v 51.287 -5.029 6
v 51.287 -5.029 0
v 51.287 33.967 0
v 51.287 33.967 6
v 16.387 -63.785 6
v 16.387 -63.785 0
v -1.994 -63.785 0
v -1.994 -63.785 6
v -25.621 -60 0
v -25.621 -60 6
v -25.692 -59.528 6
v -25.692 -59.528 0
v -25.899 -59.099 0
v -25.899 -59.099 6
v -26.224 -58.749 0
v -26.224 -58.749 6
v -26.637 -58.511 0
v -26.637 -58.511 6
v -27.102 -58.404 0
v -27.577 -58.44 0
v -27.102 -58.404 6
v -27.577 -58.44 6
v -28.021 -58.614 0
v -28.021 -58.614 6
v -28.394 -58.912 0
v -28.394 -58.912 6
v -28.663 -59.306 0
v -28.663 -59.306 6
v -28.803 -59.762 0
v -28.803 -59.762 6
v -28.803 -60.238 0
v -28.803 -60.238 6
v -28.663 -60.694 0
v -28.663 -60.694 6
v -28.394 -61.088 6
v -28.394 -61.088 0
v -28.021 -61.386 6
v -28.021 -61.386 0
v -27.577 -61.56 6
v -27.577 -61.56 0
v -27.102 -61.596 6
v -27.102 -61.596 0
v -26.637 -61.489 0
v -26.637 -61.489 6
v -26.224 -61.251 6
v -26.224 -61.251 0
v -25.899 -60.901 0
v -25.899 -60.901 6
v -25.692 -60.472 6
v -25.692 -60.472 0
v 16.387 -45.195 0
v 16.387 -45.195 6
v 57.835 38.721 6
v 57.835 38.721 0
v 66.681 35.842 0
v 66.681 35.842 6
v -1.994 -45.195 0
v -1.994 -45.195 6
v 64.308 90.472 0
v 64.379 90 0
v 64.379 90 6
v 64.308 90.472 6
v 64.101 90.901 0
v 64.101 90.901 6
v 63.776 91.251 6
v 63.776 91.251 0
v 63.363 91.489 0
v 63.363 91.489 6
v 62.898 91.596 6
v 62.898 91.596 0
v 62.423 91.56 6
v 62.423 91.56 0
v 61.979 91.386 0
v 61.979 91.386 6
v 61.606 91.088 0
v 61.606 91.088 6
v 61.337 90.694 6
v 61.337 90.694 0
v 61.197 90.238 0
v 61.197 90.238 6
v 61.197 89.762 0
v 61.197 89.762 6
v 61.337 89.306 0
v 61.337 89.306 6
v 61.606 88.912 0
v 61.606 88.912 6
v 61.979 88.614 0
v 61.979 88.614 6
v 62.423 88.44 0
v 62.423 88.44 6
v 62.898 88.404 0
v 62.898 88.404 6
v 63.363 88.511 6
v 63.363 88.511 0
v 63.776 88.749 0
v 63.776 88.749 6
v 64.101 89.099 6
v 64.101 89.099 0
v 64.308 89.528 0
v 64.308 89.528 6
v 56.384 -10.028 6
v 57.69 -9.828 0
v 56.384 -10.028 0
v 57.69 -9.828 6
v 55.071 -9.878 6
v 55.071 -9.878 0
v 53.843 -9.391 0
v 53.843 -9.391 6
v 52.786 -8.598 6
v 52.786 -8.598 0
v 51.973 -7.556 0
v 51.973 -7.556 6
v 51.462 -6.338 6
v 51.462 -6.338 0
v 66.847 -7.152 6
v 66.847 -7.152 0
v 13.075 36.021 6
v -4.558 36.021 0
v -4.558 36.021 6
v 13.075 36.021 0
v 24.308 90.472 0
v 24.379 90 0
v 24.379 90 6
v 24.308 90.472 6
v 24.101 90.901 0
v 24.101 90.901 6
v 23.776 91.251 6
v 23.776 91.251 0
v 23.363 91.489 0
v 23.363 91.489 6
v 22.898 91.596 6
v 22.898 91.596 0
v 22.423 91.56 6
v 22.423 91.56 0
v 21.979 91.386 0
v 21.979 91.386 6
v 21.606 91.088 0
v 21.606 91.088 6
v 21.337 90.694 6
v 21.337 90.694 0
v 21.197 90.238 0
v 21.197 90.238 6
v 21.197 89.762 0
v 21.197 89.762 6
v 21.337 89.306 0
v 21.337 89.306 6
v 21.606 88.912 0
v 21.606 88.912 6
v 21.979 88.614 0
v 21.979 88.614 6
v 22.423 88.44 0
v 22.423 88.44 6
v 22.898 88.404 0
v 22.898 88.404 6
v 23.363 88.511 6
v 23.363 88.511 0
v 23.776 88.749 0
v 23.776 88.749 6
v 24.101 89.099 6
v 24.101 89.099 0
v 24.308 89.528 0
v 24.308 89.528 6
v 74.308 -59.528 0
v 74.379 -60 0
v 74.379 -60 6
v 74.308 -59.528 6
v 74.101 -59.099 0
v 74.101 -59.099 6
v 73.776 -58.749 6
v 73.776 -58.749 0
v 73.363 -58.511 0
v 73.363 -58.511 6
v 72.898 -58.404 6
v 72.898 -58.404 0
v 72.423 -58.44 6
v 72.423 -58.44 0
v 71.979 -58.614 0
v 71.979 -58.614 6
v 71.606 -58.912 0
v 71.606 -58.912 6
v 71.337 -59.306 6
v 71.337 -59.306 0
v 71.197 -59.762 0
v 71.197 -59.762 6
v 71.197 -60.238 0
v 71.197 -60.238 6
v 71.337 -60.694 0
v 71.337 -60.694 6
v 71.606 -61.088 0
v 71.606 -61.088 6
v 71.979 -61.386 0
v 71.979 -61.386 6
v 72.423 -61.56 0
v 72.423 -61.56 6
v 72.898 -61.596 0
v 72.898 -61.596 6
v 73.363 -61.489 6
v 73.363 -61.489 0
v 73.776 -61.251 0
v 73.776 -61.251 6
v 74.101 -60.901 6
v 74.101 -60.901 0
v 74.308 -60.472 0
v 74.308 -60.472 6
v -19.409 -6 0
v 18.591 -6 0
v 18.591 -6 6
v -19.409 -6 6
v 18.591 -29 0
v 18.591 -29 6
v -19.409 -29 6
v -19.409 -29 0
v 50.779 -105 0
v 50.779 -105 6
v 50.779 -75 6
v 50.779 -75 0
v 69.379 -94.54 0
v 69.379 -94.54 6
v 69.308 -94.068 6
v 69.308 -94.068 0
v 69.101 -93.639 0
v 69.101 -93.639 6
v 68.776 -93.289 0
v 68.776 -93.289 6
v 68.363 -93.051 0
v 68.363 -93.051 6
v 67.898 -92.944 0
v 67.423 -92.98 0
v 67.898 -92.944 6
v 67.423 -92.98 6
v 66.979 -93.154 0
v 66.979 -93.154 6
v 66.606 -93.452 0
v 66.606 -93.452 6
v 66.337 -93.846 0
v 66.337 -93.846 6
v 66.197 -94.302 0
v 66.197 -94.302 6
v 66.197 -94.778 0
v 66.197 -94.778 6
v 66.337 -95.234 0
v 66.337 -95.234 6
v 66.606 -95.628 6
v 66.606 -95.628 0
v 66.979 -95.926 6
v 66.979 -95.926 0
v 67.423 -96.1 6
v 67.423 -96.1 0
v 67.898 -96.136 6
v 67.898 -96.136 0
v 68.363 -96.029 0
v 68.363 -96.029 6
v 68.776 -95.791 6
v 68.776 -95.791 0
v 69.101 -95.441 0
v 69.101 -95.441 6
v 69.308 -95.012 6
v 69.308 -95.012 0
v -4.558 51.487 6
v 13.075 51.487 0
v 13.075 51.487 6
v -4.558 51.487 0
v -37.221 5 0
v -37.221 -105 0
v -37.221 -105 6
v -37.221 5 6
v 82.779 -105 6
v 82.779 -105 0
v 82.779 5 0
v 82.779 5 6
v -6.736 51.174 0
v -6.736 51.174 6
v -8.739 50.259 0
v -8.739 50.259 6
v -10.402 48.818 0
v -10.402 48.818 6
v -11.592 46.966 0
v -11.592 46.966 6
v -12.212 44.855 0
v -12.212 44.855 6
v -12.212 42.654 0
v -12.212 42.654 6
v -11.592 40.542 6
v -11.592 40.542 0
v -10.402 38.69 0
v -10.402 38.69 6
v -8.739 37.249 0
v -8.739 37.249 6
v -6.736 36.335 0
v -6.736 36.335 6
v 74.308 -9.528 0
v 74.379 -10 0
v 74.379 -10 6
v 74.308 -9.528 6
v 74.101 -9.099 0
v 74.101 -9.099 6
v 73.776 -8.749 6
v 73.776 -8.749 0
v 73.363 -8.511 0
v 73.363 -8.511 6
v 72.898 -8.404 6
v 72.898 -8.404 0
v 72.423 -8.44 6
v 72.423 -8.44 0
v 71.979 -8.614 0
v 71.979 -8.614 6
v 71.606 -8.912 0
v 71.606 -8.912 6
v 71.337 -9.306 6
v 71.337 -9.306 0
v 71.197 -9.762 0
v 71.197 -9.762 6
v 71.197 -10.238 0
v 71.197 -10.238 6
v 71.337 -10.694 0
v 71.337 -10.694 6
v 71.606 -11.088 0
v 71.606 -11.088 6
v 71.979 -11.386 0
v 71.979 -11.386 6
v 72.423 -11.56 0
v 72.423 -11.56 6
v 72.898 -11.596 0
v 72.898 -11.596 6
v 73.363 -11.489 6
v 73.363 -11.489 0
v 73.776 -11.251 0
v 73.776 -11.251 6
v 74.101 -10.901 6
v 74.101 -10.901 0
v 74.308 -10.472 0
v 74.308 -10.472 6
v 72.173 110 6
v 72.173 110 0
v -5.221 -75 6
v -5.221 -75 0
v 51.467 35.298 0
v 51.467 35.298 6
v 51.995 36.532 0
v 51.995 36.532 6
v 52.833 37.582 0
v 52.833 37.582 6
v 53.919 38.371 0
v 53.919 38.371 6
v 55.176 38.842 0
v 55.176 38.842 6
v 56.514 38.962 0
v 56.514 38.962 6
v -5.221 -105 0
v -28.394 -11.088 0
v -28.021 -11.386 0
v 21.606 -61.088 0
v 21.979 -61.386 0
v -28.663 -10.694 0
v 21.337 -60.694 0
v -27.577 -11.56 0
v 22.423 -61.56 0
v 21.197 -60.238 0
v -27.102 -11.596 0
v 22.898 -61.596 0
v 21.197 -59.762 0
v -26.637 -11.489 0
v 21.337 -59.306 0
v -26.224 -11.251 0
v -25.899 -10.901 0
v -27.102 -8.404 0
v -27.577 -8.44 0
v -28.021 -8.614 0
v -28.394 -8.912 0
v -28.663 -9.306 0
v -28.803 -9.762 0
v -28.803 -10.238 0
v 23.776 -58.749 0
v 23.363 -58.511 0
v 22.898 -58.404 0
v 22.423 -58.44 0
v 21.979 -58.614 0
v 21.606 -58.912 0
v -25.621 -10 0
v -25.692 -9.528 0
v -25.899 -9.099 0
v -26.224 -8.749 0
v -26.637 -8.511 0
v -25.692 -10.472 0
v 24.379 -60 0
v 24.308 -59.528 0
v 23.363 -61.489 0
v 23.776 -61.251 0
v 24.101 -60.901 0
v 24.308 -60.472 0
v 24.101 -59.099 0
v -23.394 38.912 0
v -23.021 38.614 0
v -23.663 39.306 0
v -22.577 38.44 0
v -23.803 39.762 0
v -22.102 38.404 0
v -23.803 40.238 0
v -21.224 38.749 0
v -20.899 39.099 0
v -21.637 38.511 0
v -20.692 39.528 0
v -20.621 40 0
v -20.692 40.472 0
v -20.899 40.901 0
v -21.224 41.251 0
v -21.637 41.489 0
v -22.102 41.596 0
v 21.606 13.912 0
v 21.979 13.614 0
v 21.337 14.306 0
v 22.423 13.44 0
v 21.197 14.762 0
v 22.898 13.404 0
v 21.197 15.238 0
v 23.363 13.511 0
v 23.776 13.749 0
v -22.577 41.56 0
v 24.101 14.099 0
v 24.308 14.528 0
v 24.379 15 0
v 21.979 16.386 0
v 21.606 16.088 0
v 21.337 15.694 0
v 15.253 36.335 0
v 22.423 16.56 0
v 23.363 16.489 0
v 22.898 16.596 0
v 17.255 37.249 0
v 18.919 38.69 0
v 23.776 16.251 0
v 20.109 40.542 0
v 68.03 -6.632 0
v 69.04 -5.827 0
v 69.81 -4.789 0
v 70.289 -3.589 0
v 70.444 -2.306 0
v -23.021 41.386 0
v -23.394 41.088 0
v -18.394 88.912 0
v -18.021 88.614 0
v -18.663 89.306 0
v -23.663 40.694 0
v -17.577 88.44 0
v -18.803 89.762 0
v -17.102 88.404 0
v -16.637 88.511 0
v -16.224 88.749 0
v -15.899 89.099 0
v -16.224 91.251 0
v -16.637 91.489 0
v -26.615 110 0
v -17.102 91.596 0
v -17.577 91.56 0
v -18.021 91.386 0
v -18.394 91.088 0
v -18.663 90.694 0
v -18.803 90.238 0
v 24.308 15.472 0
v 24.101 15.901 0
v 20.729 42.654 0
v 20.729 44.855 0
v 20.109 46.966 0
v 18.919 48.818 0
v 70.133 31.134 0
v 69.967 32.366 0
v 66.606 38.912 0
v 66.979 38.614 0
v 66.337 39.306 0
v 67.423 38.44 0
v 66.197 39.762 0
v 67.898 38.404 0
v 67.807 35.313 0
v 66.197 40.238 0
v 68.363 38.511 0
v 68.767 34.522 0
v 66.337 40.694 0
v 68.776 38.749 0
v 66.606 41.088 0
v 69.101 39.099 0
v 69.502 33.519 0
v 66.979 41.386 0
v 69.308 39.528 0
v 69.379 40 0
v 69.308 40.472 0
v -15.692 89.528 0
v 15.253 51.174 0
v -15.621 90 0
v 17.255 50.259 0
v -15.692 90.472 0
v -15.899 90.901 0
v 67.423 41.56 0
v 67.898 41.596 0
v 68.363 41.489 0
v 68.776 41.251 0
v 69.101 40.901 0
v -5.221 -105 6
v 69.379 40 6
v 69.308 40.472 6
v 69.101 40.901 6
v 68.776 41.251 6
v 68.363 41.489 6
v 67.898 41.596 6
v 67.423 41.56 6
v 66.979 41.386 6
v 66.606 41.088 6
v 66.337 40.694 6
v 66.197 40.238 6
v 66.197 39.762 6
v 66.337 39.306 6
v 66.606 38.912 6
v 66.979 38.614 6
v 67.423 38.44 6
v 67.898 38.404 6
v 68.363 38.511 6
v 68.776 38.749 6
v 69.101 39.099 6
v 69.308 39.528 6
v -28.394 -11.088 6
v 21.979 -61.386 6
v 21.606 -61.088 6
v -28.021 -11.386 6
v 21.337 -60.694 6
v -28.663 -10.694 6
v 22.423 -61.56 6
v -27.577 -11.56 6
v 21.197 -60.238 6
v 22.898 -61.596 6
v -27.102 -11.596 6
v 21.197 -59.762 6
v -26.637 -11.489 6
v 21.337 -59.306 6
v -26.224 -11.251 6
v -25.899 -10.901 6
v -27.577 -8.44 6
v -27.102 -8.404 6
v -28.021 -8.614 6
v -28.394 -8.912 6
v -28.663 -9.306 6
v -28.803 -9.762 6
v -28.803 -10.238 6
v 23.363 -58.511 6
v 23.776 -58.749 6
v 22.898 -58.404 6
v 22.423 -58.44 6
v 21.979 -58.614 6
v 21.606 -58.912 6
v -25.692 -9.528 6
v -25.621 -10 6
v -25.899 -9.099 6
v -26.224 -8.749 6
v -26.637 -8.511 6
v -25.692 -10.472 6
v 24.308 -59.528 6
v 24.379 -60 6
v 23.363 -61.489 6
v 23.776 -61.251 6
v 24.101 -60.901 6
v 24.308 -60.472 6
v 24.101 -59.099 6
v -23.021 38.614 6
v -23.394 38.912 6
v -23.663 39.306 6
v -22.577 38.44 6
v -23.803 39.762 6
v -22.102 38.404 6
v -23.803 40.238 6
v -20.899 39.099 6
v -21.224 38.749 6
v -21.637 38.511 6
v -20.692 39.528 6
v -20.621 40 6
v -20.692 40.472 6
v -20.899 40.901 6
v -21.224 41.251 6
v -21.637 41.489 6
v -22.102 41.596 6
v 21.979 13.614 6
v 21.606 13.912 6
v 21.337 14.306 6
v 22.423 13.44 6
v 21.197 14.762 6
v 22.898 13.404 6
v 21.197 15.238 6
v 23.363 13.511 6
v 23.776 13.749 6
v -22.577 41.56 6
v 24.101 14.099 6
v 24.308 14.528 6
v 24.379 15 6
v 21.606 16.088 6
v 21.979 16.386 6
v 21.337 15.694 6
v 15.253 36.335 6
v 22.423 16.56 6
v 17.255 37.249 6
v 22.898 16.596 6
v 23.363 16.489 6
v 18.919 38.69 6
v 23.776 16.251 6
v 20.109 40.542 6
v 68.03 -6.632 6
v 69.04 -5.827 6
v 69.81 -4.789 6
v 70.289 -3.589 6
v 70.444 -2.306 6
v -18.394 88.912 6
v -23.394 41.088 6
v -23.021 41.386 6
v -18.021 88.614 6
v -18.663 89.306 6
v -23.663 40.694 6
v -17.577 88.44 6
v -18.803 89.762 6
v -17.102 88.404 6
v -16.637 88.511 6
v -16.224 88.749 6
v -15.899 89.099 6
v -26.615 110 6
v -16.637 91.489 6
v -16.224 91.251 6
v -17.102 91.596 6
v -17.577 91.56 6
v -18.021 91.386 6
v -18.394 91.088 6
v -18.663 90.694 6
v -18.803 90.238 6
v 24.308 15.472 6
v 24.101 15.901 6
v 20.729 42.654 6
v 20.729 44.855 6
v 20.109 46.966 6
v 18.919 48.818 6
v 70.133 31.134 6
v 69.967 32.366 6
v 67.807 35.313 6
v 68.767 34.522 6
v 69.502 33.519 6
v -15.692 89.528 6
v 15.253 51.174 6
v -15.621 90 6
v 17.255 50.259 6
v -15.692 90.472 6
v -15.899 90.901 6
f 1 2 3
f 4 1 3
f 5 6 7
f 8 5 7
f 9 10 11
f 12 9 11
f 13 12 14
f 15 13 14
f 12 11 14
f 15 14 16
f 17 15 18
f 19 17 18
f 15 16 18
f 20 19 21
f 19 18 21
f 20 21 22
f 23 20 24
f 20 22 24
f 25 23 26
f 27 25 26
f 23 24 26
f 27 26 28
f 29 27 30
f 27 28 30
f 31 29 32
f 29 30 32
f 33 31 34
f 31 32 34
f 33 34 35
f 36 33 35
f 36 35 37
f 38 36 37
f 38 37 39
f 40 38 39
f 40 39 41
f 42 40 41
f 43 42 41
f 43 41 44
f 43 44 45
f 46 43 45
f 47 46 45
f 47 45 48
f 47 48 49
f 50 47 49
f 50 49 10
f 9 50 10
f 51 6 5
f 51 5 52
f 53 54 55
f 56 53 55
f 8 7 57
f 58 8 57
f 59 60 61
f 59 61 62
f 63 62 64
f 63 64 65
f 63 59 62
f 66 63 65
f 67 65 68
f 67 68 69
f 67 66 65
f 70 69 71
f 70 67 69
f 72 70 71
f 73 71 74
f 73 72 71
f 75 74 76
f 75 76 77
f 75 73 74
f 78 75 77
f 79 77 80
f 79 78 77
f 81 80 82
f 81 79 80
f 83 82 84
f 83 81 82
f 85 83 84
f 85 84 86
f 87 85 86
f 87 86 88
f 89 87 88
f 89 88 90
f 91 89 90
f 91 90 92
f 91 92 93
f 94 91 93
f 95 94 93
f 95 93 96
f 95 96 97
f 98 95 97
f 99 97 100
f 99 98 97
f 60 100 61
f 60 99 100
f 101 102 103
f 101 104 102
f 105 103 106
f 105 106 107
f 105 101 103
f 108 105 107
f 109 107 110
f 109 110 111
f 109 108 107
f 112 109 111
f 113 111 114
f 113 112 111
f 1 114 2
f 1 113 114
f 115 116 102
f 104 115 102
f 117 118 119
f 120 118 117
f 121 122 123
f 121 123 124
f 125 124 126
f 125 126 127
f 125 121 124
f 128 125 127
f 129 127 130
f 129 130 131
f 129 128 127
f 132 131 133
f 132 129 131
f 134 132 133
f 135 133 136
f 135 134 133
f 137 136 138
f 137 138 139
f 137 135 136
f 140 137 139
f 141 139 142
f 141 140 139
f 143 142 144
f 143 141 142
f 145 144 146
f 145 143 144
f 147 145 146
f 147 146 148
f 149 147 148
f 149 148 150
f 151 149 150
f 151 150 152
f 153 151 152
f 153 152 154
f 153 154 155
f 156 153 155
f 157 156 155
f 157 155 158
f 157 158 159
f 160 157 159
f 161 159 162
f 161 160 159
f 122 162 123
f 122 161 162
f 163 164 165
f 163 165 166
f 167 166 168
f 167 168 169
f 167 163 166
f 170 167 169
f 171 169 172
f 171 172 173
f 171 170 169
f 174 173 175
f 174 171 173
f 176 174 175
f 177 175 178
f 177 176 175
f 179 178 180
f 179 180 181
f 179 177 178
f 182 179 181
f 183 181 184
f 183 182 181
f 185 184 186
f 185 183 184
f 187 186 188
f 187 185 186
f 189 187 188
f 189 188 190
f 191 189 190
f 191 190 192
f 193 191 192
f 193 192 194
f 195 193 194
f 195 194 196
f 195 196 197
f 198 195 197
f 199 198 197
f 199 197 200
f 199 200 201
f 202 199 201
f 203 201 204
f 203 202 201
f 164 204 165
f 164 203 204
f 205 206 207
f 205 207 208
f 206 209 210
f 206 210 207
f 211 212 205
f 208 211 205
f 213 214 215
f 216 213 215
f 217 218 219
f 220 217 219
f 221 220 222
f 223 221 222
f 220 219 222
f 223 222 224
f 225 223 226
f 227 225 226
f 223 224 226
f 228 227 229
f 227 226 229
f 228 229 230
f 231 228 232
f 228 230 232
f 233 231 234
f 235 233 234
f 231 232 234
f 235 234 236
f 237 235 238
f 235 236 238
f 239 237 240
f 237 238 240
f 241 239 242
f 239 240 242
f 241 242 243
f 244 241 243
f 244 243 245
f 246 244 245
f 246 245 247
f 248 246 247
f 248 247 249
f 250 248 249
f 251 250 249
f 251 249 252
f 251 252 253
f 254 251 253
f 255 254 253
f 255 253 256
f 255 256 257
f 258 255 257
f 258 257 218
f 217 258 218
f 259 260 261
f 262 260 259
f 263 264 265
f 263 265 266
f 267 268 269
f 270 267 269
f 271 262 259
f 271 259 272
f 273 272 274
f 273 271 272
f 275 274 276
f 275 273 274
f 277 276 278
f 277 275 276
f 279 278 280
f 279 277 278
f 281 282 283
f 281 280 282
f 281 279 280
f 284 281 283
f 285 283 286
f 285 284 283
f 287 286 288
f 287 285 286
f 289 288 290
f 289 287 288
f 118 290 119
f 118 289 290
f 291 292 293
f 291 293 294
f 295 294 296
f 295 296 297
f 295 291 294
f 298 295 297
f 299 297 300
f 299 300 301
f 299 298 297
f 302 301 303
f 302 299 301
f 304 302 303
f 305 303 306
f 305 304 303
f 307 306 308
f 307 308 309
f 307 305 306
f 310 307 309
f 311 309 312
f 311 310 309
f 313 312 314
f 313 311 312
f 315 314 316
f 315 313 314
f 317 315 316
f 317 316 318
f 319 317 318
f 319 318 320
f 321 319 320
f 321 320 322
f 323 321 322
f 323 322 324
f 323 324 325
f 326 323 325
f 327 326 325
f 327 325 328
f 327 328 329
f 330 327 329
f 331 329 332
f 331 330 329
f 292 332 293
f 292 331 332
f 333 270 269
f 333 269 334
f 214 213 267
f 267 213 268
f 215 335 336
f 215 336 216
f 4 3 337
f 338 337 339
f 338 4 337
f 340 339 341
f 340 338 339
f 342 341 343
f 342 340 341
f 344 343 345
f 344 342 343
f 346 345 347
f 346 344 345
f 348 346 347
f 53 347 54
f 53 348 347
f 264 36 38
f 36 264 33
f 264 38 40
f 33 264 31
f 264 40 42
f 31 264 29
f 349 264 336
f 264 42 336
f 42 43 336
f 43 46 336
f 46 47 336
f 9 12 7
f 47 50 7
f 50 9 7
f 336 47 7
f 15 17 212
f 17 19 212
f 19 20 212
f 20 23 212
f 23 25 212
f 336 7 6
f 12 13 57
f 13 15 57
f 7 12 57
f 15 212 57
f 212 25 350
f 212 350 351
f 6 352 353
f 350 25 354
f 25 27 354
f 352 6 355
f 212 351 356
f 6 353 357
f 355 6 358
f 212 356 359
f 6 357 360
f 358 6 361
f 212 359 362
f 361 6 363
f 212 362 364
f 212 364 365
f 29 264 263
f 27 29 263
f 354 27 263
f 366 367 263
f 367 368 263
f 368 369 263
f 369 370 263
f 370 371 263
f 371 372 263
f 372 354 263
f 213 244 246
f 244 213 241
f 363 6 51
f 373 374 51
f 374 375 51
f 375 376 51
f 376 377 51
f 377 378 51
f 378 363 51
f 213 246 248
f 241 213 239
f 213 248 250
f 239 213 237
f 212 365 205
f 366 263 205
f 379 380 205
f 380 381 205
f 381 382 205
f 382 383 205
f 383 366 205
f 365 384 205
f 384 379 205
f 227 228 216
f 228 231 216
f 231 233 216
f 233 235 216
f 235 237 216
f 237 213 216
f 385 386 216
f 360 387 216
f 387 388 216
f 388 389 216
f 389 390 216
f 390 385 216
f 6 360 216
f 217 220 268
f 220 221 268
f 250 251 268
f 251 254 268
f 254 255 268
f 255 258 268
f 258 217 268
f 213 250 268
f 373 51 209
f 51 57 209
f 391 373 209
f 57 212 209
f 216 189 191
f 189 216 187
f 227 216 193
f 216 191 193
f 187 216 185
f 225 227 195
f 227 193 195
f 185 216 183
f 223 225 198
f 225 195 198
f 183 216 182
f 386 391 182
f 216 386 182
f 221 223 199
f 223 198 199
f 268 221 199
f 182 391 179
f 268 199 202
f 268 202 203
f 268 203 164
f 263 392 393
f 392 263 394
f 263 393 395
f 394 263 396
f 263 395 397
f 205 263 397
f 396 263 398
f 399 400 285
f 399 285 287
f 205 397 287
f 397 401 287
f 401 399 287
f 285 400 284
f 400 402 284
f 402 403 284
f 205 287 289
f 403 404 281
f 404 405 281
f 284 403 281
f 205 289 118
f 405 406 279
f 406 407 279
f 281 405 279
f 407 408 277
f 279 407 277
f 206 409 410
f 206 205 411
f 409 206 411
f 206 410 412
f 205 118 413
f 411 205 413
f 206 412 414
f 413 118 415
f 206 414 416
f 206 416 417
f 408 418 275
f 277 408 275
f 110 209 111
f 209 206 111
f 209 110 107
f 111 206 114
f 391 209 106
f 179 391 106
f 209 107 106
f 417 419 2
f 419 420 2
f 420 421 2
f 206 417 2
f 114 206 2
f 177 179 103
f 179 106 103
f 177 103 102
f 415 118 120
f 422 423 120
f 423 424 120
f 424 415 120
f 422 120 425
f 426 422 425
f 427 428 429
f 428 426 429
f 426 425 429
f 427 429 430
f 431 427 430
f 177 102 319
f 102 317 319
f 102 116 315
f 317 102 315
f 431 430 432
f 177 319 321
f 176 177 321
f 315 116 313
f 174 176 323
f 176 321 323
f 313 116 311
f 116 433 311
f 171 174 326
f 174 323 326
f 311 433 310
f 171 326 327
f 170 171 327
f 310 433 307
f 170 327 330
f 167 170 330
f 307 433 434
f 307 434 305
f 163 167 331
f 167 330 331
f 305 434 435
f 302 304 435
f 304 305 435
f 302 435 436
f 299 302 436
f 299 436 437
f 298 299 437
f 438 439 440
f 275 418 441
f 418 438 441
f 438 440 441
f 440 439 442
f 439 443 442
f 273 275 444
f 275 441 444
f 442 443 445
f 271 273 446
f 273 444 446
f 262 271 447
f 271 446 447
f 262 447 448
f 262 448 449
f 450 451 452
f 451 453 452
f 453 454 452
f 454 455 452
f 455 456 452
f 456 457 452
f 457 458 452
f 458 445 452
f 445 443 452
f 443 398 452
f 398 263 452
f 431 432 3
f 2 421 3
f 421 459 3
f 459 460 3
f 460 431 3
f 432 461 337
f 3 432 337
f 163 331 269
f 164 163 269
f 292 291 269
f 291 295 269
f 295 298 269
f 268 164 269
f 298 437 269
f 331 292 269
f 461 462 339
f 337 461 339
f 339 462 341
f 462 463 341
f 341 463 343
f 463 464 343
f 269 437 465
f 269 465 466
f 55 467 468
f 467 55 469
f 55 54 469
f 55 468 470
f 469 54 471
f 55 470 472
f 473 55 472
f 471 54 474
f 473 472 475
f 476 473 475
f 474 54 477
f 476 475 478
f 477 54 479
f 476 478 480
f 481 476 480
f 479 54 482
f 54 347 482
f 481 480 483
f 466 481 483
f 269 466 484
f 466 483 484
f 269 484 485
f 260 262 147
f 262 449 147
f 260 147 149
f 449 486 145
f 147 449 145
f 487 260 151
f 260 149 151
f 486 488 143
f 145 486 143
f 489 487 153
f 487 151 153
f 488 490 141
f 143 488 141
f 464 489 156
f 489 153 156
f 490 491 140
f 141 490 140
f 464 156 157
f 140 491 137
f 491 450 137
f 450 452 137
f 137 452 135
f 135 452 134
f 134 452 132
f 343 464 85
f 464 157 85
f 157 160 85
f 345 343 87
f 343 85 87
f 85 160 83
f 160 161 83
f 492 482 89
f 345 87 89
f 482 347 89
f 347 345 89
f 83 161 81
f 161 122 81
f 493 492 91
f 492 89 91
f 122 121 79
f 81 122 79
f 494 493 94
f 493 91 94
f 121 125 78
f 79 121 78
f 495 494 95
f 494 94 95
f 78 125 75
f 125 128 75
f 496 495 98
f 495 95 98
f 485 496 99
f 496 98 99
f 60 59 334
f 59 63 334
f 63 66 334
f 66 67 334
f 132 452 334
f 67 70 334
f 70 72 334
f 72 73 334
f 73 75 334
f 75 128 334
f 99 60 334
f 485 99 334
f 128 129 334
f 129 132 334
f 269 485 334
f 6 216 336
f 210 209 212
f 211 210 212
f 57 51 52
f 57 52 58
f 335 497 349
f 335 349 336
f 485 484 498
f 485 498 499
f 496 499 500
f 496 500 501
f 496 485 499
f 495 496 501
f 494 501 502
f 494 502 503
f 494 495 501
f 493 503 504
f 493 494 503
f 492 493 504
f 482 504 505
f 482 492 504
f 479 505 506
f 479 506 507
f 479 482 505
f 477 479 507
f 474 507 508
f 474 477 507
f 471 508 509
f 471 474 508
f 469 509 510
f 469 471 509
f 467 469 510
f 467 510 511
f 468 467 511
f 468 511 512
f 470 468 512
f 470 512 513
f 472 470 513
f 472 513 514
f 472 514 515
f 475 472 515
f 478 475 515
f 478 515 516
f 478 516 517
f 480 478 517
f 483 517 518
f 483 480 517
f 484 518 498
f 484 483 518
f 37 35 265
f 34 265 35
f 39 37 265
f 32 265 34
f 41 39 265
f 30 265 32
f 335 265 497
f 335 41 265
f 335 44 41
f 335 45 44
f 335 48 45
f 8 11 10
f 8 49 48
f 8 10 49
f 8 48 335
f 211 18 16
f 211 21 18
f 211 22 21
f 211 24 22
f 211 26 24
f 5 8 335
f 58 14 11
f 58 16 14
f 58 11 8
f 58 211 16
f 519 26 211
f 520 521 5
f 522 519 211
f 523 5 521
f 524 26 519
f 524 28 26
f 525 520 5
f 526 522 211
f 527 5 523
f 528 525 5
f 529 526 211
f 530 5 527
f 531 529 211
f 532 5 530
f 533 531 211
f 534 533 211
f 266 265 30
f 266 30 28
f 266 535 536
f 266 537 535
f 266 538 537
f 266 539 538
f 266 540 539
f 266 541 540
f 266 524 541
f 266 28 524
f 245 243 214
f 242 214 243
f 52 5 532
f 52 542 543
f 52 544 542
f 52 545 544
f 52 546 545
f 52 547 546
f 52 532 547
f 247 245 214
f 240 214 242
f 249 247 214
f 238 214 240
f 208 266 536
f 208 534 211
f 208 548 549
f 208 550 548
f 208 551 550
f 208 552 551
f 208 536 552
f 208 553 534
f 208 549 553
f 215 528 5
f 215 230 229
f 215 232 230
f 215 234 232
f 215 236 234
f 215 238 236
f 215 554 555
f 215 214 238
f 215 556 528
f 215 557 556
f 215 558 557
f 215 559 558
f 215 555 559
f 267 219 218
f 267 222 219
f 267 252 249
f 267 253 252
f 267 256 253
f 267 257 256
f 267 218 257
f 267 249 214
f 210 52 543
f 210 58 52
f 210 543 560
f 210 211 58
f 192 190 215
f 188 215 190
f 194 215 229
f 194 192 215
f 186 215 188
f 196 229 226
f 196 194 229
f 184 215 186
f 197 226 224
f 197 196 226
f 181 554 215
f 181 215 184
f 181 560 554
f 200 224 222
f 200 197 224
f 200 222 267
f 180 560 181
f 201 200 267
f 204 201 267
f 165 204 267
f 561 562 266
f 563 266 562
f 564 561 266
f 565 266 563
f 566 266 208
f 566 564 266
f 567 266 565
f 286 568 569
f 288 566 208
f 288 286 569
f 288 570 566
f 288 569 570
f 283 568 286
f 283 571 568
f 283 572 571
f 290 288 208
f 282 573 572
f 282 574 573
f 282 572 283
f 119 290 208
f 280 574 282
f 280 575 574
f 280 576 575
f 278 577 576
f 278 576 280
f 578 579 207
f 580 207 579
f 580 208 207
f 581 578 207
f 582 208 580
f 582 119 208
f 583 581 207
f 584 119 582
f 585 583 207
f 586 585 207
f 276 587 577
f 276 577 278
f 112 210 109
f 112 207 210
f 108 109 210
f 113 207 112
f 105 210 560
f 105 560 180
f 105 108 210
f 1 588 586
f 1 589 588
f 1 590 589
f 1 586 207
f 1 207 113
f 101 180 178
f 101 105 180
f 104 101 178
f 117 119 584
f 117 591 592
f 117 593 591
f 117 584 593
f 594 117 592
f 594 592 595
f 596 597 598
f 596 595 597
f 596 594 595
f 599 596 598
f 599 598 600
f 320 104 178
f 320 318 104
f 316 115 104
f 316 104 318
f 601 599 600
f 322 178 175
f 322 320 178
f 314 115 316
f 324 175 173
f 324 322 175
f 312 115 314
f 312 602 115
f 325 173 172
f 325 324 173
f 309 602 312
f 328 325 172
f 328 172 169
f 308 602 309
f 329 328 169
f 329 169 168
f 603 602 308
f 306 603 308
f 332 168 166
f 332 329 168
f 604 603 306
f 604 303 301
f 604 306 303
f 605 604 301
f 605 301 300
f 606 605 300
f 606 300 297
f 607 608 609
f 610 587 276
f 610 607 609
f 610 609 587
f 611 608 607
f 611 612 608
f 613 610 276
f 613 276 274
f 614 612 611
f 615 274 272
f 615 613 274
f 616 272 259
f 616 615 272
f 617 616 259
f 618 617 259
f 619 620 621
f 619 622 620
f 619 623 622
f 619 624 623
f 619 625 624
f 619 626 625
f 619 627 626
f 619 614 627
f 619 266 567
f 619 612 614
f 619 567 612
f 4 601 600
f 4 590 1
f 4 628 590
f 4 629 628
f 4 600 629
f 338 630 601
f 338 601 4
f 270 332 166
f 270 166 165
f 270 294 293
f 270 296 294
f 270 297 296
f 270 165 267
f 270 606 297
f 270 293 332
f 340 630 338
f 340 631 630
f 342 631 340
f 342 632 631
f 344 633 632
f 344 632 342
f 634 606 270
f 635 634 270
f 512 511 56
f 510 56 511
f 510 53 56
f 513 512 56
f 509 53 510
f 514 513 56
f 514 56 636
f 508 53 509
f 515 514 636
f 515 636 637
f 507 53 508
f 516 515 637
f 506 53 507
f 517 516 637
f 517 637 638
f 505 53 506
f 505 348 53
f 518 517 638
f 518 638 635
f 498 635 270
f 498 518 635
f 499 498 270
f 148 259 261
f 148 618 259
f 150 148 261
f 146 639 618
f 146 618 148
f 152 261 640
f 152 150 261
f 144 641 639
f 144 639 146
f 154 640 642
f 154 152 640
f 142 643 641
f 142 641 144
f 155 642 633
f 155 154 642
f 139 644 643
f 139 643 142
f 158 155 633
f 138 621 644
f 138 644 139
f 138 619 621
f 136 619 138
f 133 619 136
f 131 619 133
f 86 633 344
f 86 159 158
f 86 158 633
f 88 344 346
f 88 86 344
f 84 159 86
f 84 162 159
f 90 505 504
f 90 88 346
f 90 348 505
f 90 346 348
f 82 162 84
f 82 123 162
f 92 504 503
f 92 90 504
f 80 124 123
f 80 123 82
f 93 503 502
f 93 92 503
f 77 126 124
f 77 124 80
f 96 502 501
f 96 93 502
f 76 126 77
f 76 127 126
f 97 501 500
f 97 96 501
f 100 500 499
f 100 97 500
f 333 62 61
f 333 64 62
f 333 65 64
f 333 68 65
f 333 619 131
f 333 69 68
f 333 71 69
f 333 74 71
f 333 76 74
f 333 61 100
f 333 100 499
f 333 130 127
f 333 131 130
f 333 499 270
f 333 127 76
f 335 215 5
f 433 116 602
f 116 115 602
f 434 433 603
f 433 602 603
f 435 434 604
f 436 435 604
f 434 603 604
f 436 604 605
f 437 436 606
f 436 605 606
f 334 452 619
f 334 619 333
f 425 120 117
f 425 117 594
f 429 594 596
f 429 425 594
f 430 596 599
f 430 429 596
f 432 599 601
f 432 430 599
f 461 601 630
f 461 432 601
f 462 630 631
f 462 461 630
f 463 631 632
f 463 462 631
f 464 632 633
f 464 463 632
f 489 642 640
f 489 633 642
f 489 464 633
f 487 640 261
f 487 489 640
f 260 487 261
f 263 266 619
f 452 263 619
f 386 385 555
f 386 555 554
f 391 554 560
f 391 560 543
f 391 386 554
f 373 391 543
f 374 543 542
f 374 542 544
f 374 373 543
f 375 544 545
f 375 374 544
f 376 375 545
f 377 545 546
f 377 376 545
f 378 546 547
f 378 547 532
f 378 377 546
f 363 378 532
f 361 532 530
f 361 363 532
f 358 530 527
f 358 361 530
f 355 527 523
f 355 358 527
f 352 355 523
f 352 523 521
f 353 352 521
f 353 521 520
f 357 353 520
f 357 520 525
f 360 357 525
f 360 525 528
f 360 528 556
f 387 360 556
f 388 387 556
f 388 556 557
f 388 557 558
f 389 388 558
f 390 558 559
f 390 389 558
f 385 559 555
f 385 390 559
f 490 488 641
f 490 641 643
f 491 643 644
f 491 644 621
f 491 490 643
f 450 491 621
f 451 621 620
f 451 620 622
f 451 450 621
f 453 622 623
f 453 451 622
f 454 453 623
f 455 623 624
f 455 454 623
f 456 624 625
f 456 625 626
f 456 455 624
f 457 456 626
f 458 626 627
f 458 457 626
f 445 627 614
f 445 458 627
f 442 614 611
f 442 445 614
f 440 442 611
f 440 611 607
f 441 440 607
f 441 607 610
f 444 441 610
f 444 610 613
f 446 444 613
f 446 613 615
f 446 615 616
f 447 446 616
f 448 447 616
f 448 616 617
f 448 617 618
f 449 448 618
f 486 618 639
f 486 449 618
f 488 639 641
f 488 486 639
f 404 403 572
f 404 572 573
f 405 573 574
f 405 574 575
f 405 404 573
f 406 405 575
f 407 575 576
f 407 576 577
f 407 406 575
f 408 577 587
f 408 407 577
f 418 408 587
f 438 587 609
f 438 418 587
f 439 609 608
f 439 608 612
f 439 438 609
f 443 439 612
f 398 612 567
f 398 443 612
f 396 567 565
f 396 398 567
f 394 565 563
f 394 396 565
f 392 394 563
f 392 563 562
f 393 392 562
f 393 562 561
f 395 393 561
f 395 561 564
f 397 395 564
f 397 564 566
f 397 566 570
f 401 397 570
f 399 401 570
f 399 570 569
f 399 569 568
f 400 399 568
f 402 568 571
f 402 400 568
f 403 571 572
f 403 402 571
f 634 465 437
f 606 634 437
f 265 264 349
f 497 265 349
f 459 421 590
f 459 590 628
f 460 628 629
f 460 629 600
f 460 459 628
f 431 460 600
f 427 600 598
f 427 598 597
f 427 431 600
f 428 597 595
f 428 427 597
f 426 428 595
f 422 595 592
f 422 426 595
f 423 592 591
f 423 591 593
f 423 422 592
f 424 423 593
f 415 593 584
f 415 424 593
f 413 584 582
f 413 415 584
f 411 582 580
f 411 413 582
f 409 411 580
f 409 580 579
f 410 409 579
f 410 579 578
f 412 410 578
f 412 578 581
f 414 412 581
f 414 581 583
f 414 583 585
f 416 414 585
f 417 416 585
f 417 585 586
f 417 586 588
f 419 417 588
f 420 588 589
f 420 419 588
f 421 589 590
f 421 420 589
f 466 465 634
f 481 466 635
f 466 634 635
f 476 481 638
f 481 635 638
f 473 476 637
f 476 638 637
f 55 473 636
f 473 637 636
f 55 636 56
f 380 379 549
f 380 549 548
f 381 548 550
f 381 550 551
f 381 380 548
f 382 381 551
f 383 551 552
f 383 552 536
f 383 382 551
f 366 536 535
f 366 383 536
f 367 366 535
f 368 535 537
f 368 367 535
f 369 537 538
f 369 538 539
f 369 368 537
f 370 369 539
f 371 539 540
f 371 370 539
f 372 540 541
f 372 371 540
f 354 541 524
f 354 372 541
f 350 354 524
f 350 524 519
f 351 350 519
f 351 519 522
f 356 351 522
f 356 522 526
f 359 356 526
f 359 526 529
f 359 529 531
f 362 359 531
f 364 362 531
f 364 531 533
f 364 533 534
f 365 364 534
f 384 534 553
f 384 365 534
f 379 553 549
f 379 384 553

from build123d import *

# Parameters (mm, degrees)
ESQUISSE1_W                    = 120
ESQUISSE1_H                    = 215
BOSS_EXTRU_1_DEPTH             = 6
ESQUISSE2_R                    = 1.6
ENL_V_MAT_EXTRU_1_DEPTH        = 138.798088748
R_P_TITION_LIN_AIRE1_OUTLINE_R = 1.6
R_P_TITION_LIN_AIRE1_DEPTH     = 6
ESQUISSE3_W                    = 38
ESQUISSE3_H                    = 23
ESQUISSE3_W_2                  = 18.381114661
ESQUISSE3_H_2                  = 18.590181779
ENL_V_MAT_EXTRU_2_DEPTH        = 138.798088748
ENL_V_MAT_EXTRU_3_DEPTH        = 138.798088748
CONG_1_R                       = 5
ESQUISSE5_R                    = 1.6
ENL_V_MAT_EXTRU_4_DEPTH        = 10
ESQUISSE6_W                    = 56
ESQUISSE6_H                    = 30
ENL_V_MAT_EXTRU_5_DEPTH        = 138.798088748


# Read off the part's stored shape, not the designer's step: Répétition linéaire1
with BuildPart() as part:
    # Esquisse1 → Boss.-Extru.1 (new body)
    with BuildSketch(Plane.XY):
        with Locations((22.778700537, 2.5)):
            Rectangle(ESQUISSE1_W, ESQUISSE1_H)
    extrude(amount=BOSS_EXTRU_1_DEPTH)

    # Esquisse2 → Enlèv. mat.-Extru.1 (cut, through all)
    with BuildSketch(Plane.XY.offset(6)):
        with Locations((-27.221299463, -60)):
            Circle(ESQUISSE2_R)
    extrude(amount=-ENL_V_MAT_EXTRU_1_DEPTH, mode=Mode.SUBTRACT)

    # Répétition linéaire1 outline → Répétition linéaire1 (cut)
    with BuildSketch(Plane.XY):
        with Locations((-27.221299463, -10)):
            Circle(R_P_TITION_LIN_AIRE1_OUTLINE_R)
        with Locations((-22.221299463, 40)):
            Circle(R_P_TITION_LIN_AIRE1_OUTLINE_R)
        with Locations((-17.221299463, 90)):
            Circle(R_P_TITION_LIN_AIRE1_OUTLINE_R)
        with Locations((22.778700537, -60)):
            Circle(R_P_TITION_LIN_AIRE1_OUTLINE_R)
        with Locations((22.778700537, 15)):
            Circle(R_P_TITION_LIN_AIRE1_OUTLINE_R)
        with Locations((62.778700537, 90)):
            Circle(R_P_TITION_LIN_AIRE1_OUTLINE_R)
        with Locations((67.778700537, 40)):
            Circle(R_P_TITION_LIN_AIRE1_OUTLINE_R)
        with Locations((72.778700537, -10)):
            Circle(R_P_TITION_LIN_AIRE1_OUTLINE_R)
        with Locations((72.778700537, -60)):
            Circle(R_P_TITION_LIN_AIRE1_OUTLINE_R)
        with Locations((22.778700537, 90)):
            Circle(R_P_TITION_LIN_AIRE1_OUTLINE_R)
    extrude(amount=R_P_TITION_LIN_AIRE1_DEPTH, mode=Mode.SUBTRACT)

    # Esquisse3 → Enlèv. mat.-Extru.2 (cut, through all)
    with BuildSketch(Plane(origin=(0, 0, 0), x_dir=(-1, 0, 0), z_dir=(0, 0, -1))):
        with Locations((0.408750369, -17.5)):
            Rectangle(ESQUISSE3_W, ESQUISSE3_H)
        with Locations((-7.196798698, -54.48972052)):
            Rectangle(ESQUISSE3_W_2, ESQUISSE3_H_2)
        with BuildLine():
            Line((4.557875847, 36.021320392), (-13.074694363, 36.021320392))
            ThreePointArc((-13.074694363, 36.021320392), (-20.807462052, 43.75408808), (-13.074694363, 51.486855768))
            Line((-13.074694363, 51.486855768), (4.557875847, 51.486855768))
            ThreePointArc((4.557875847, 51.486855768), (12.290643535, 43.75408808), (4.557875847, 36.021320392))
        make_face()
        Polygon((-51.286994849, -11.69900166), (-51.286994849, 40.852954993), (-70.100011596, 34.728797636), (-70.479177032, -6.090187837), align=None)
        with BuildLine():
            Line((-30.778700537, -101), (-30.778700537, -105))
            Line((-30.778700537, -105), (-14.778700537, -105))
            Line((-14.778700537, -105), (-14.778700537, -101))
            ThreePointArc((-14.778700537, -101), (-22.778700537, -93), (-30.778700537, -101))
        make_face()
    extrude(amount=-ENL_V_MAT_EXTRU_2_DEPTH, mode=Mode.SUBTRACT)

    # Esquisse4 → Enlèv. mat.-Extru.3 (cut, through all)
    with BuildSketch(Plane.XY.offset(6)):
        Polygon((-37.221299463, 110), (-37.221299463, 4.99999922), (-26.615238451, 110), align=None)
        Polygon((72.172639526, 110), (82.778700537, 110), (82.778700537, 4.99999922), align=None)
    extrude(amount=-ENL_V_MAT_EXTRU_3_DEPTH, mode=Mode.SUBTRACT)

    # Congé1
    cong_1_edges = [part.edges().sort_by_distance(p)[0] for p in [
        (70.100011596, 34.728797636, 3),
        (51.286994849, 40.852954993, 3),
        (51.286994849, -11.69900166, 3),
        (70.479177032, -6.090187837, 3),
    ]]
    fillet(cong_1_edges, radius=CONG_1_R)

    # Esquisse5 → Enlèv. mat.-Extru.4 (cut)
    with BuildSketch(Plane.XY.offset(6)):
        with Locations((67.778700537, -94.54)):
            Circle(ESQUISSE5_R)
    extrude(amount=-ENL_V_MAT_EXTRU_4_DEPTH, mode=Mode.SUBTRACT)

    # Esquisse6 → Enlèv. mat.-Extru.5 (cut, through all)
    with BuildSketch(Plane.XY.offset(6)):
        with Locations((22.778700537, -90)):
            Rectangle(ESQUISSE6_W, ESQUISSE6_H)
    extrude(amount=-ENL_V_MAT_EXTRU_5_DEPTH, mode=Mode.SUBTRACT)


solid = part.part
